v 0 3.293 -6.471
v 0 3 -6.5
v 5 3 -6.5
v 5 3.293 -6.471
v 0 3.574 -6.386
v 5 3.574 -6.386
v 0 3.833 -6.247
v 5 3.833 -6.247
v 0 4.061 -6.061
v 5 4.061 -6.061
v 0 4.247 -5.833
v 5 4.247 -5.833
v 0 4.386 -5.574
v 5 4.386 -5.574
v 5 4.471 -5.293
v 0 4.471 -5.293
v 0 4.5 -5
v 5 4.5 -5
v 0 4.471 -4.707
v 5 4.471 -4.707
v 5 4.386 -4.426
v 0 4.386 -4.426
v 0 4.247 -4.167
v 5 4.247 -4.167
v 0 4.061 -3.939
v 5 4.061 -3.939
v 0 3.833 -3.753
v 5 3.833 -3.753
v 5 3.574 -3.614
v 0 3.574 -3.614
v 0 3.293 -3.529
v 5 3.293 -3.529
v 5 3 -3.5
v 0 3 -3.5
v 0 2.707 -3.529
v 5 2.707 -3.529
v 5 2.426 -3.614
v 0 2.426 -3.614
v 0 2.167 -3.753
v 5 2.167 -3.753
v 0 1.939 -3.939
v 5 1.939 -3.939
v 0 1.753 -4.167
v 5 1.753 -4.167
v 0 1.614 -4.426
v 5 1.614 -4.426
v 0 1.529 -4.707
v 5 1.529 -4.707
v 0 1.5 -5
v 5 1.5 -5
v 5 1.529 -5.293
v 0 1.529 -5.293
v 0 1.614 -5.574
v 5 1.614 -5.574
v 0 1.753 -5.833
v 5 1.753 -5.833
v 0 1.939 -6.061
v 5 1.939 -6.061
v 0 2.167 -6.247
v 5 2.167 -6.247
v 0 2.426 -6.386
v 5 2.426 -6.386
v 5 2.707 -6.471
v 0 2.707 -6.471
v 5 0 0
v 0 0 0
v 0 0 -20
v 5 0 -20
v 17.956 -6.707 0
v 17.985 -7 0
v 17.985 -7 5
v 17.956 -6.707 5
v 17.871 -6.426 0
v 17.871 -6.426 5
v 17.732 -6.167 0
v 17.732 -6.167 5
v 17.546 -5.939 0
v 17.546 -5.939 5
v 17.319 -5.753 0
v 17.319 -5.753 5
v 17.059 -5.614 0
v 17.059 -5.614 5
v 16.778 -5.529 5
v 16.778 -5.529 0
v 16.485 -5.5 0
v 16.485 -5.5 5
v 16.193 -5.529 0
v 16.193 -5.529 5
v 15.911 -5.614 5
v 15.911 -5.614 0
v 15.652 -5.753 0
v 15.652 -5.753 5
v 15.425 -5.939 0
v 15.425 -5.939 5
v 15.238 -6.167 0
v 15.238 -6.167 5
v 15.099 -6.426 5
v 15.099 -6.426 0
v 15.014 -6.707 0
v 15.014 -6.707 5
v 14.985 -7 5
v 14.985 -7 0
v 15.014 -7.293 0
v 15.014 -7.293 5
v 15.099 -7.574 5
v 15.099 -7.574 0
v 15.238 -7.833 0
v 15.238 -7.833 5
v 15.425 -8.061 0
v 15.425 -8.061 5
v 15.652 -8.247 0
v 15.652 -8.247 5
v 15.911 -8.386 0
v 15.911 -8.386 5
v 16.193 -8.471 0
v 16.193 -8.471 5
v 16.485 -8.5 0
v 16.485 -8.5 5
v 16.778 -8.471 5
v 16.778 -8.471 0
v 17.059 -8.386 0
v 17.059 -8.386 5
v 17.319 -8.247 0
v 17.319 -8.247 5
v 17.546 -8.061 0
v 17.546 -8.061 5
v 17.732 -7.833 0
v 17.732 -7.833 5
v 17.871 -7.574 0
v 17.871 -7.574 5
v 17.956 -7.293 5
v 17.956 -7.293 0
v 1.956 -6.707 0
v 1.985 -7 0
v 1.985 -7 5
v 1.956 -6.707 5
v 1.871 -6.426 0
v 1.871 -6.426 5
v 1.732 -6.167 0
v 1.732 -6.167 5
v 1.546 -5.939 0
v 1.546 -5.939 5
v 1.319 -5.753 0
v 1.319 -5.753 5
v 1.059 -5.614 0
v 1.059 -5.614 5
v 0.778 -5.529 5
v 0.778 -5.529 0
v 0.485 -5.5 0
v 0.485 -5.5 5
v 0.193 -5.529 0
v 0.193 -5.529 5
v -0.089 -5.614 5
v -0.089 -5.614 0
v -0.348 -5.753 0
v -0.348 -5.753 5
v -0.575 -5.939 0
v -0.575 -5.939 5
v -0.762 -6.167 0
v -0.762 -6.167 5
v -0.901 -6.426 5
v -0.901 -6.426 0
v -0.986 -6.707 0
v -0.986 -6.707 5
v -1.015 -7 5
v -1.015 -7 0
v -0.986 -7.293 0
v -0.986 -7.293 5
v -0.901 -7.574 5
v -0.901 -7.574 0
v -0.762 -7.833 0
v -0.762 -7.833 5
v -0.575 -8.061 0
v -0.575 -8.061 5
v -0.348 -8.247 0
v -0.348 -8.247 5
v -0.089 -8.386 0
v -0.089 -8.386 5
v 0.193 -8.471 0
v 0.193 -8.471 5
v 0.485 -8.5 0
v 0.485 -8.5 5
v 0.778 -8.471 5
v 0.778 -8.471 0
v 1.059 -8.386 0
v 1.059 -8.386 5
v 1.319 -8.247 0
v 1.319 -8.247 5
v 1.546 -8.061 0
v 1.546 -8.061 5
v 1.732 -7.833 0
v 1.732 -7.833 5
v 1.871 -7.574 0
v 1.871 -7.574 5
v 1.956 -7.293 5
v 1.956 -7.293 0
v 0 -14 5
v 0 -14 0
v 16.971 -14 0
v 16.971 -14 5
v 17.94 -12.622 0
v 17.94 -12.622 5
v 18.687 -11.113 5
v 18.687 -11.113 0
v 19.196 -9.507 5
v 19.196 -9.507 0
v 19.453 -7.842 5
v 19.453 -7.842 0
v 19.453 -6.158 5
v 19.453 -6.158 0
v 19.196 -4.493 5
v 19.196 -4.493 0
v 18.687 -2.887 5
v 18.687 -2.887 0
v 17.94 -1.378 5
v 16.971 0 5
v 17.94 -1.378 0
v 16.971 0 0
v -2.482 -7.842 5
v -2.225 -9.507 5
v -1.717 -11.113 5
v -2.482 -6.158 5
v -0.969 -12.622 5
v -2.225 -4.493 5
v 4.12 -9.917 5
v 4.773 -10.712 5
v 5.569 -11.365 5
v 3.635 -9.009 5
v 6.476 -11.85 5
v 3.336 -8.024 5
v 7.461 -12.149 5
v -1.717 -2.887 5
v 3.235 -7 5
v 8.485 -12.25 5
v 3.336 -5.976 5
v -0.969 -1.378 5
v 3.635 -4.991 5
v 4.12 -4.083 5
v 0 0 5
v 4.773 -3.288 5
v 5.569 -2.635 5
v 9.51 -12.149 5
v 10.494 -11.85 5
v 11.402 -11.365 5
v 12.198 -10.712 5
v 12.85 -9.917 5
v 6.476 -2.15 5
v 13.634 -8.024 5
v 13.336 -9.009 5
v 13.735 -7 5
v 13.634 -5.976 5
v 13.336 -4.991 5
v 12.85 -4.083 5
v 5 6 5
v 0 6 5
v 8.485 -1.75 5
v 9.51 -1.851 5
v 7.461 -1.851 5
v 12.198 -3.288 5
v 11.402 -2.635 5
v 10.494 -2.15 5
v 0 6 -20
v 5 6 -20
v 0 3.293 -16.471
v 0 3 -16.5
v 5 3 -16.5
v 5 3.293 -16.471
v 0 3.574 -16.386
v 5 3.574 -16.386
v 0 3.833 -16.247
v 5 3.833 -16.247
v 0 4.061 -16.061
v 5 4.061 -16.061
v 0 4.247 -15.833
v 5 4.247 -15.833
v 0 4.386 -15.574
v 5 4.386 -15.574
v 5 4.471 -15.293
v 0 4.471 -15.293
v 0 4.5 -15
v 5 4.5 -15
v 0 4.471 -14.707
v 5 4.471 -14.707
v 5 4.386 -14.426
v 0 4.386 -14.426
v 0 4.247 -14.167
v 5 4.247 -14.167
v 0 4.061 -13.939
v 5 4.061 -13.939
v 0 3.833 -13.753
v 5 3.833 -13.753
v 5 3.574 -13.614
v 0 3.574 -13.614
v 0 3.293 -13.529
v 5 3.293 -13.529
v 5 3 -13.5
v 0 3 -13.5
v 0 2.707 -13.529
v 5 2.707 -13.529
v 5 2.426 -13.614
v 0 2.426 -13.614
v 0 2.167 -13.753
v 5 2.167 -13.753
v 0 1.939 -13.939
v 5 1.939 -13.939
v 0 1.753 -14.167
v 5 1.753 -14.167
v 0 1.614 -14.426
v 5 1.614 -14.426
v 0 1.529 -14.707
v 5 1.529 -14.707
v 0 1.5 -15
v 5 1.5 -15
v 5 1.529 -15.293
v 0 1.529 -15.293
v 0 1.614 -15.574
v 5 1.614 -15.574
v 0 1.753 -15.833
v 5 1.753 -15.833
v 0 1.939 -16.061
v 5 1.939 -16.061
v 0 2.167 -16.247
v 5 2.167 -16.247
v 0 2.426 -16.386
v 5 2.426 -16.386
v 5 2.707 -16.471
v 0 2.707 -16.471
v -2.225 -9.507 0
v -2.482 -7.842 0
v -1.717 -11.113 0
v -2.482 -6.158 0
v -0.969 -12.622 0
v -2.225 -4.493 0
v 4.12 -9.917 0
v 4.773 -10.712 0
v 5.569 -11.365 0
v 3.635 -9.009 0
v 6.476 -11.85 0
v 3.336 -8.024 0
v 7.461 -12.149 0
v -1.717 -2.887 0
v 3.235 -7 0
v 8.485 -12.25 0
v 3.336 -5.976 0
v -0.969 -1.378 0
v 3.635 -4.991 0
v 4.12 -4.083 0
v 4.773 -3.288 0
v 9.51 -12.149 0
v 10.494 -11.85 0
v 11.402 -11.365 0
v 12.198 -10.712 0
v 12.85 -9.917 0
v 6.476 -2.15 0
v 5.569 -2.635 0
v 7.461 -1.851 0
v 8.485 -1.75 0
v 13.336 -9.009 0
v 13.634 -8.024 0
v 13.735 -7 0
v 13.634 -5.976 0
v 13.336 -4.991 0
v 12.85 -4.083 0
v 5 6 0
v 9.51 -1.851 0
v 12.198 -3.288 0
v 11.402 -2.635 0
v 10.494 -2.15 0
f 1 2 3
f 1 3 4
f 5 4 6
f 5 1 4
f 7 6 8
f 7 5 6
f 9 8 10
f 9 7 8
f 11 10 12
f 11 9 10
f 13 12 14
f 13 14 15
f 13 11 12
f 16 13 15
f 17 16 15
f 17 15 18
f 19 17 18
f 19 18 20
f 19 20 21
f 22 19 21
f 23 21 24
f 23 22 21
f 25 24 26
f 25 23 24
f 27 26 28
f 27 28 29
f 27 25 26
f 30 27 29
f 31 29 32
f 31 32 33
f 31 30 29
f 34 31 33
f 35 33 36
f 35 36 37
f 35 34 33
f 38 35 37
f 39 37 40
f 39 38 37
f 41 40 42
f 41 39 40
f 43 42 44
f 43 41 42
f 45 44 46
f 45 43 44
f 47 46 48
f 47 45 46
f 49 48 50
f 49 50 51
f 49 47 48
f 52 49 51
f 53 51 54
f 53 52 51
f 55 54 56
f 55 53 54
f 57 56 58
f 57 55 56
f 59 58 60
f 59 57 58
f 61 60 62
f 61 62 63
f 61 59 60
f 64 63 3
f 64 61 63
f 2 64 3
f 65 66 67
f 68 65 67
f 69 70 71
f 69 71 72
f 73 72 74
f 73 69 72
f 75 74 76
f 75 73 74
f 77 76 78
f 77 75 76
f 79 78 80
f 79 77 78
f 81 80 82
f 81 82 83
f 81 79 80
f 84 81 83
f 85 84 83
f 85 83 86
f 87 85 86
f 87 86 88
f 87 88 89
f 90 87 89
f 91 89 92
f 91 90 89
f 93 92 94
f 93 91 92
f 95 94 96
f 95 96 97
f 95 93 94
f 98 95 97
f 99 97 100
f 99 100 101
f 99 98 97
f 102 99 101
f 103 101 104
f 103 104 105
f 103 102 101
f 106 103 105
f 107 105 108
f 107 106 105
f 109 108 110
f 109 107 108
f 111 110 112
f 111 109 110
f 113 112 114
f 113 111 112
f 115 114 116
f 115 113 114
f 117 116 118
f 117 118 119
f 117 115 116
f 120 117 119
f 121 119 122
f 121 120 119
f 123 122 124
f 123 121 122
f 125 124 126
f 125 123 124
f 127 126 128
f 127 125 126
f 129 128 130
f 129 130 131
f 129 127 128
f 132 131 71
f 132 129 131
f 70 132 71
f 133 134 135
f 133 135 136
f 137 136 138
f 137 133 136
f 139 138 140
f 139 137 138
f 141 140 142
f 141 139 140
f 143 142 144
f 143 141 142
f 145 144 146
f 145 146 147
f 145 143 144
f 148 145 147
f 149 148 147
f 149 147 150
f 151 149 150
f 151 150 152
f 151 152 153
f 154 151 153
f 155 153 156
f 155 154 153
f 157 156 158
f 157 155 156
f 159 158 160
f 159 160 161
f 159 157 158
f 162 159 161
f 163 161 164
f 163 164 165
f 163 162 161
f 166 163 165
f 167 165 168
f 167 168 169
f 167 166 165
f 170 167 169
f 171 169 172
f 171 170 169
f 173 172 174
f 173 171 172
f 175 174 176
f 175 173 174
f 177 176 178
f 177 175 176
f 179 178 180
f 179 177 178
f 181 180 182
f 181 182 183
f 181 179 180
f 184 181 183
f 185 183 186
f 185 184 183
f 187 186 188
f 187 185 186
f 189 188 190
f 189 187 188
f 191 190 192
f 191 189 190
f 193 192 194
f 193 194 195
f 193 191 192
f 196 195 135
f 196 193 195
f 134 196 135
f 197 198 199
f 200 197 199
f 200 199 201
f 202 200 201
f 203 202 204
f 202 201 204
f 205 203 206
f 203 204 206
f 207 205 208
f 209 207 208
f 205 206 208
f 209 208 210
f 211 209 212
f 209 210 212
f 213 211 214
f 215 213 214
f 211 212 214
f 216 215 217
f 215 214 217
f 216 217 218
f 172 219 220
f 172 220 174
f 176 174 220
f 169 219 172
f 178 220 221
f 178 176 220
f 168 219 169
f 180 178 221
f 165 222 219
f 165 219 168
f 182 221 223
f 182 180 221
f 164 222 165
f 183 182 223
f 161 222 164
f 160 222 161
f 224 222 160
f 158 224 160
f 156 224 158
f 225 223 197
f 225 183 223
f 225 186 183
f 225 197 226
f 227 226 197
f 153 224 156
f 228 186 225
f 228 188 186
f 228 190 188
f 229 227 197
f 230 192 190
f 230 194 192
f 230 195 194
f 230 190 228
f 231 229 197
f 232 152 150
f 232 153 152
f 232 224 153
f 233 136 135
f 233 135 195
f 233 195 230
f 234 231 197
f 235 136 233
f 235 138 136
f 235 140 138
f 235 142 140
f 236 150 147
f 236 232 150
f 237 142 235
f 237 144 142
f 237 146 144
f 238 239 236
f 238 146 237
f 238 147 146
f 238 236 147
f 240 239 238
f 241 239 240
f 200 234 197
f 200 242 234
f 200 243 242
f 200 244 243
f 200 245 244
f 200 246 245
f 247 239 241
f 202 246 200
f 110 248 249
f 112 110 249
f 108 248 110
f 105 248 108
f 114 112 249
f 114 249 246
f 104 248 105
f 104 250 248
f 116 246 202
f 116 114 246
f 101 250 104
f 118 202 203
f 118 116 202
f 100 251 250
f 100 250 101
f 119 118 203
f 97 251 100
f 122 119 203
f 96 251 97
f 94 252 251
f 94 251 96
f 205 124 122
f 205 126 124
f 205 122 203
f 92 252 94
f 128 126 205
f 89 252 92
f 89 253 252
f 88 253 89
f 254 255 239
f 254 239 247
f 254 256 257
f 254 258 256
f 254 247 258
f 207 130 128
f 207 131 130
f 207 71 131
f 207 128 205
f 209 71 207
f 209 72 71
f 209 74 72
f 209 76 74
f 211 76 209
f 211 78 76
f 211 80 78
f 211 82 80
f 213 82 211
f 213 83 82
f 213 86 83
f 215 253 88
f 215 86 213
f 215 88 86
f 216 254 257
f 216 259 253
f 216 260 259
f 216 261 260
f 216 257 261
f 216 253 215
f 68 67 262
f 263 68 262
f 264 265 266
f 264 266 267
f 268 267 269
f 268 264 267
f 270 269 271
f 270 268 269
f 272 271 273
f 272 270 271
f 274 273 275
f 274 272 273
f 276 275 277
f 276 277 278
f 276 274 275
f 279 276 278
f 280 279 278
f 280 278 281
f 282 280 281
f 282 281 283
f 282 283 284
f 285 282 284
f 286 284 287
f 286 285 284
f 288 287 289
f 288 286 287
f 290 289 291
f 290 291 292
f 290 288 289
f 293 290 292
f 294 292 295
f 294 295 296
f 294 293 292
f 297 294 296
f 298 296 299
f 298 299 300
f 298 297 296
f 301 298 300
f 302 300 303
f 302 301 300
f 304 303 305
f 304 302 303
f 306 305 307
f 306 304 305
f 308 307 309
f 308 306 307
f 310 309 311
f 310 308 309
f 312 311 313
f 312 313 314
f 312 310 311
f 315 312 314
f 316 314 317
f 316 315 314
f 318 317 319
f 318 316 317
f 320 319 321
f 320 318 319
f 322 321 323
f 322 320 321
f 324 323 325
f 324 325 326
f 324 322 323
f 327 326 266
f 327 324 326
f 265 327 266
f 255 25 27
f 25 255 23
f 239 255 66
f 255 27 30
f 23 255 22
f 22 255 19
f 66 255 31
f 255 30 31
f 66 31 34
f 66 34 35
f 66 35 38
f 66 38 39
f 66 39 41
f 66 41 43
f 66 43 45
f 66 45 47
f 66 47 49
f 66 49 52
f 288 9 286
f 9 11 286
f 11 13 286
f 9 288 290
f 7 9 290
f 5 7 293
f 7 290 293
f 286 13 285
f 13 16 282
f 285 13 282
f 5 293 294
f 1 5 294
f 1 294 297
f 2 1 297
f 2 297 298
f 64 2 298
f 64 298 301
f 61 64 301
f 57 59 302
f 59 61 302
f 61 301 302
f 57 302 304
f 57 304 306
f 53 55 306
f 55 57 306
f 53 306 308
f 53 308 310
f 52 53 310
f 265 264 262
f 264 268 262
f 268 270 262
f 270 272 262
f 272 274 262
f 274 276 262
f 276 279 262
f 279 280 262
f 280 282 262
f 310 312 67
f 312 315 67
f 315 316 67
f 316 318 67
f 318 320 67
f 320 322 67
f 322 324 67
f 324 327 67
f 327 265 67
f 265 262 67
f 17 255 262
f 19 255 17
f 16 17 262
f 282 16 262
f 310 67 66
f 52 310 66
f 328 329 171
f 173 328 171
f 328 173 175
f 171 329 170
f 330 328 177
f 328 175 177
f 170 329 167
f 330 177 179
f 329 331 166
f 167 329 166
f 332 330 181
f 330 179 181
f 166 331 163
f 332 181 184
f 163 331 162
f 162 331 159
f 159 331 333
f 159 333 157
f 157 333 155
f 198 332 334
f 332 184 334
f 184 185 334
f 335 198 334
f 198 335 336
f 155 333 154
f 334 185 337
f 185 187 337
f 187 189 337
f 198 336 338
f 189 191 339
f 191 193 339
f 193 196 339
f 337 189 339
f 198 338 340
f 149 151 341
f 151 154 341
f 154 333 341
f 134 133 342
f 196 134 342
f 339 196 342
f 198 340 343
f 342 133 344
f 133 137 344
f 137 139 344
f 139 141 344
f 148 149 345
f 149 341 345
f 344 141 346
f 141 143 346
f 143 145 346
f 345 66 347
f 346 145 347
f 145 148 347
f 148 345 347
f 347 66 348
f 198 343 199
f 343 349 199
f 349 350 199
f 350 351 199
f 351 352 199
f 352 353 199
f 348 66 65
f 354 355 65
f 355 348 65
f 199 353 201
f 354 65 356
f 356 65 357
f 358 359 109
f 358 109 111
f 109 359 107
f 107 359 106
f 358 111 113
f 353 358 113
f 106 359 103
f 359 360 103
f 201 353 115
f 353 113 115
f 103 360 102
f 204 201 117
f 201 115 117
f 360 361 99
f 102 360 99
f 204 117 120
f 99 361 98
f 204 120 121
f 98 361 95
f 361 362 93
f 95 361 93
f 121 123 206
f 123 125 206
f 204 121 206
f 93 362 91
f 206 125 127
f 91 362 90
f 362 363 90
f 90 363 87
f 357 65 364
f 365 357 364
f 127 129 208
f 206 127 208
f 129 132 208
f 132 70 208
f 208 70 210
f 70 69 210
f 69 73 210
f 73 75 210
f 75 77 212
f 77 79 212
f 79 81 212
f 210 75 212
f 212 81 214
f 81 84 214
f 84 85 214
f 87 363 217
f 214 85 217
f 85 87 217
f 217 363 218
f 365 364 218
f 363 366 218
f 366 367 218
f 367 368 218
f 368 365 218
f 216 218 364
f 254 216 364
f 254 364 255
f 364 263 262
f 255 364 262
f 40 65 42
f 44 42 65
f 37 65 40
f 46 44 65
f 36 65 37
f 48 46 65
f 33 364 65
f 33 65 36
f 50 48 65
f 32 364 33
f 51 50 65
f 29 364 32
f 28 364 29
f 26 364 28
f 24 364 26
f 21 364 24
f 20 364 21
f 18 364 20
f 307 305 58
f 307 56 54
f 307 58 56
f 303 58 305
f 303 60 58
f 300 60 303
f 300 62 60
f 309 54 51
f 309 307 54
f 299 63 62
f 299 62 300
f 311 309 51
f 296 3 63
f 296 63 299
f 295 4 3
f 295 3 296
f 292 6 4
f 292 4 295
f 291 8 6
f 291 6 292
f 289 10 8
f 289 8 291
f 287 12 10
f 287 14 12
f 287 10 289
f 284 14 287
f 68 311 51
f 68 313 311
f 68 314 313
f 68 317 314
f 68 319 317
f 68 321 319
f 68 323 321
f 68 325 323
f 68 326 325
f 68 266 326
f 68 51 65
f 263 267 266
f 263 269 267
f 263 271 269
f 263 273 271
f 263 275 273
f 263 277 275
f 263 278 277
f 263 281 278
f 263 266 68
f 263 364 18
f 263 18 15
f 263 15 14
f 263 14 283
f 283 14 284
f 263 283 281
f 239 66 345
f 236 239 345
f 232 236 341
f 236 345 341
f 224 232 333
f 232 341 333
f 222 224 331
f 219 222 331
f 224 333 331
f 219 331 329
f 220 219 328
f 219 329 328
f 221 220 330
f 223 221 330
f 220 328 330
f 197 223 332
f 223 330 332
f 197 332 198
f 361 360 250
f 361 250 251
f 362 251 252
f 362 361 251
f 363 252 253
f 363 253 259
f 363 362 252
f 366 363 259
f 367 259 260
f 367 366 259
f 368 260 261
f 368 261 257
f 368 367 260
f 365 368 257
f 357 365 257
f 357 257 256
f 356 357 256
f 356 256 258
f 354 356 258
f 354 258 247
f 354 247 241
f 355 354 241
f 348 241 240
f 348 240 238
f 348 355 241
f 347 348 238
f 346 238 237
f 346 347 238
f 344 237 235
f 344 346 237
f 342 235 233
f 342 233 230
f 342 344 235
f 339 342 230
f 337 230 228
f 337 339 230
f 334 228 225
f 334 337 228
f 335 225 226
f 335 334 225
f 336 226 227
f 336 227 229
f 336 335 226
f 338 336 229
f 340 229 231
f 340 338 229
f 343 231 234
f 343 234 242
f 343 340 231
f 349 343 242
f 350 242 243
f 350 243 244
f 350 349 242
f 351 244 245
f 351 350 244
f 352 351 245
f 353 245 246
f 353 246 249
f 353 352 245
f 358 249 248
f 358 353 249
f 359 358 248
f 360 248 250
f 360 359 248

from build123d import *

# Parameters (mm, degrees)
SKETCH_1_W      = 20
SKETCH_1_H      = 6
SKETCH_1_R      = 1.5
EXTRUDE_1_DEPTH = 5
SKETCH_2_R      = 1.5
SKETCH_2_R_2    = 5.25
EXTRUDE_2_DEPTH = 5


with BuildPart() as part:
    # 草图1 → 凸台-拉伸1 (new body)
    with BuildSketch(Plane(origin=(0, 0, 0), x_dir=(0, 0, -1), z_dir=(1, 0, 0))):
        with Locations((10, 3)):
            Rectangle(SKETCH_1_W, SKETCH_1_H)
        with Locations((5, 3)):
            Circle(SKETCH_1_R, mode=Mode.SUBTRACT)
        with Locations((15, 3)):
            Circle(SKETCH_1_R, mode=Mode.SUBTRACT)
    extrude(amount=EXTRUDE_1_DEPTH)

    # 草图2 → 凸台-拉伸2 (add)
    # profile 1 of 2: a face of its own
    with BuildSketch(Plane.XY):
        with BuildLine():
            ThreePointArc((0, 0), (-2.514718626, -7), (0, -14))
            Line((0, -14), (16.970562748, -14))
            ThreePointArc((16.970562748, -14), (19.485281374, -7), (16.970562748, 0))
            Line((16.970562748, 0), (0, 0))
        make_face()
        with Locations((0.485281374, -7)):
            Circle(SKETCH_2_R, mode=Mode.SUBTRACT)
        with Locations((8.485281374, -7)):
            Circle(SKETCH_2_R_2, mode=Mode.SUBTRACT)
        with Locations((16.485281374, -7)):
            Circle(SKETCH_2_R, mode=Mode.SUBTRACT)
    # profile 2 of 2: a face of its own
    with BuildSketch(Plane.XY):
        Polygon((0, 6), (0, 0), (16.970562748, 0), (5, 6), align=None)
    extrude(amount=EXTRUDE_2_DEPTH)


solid = part.part
